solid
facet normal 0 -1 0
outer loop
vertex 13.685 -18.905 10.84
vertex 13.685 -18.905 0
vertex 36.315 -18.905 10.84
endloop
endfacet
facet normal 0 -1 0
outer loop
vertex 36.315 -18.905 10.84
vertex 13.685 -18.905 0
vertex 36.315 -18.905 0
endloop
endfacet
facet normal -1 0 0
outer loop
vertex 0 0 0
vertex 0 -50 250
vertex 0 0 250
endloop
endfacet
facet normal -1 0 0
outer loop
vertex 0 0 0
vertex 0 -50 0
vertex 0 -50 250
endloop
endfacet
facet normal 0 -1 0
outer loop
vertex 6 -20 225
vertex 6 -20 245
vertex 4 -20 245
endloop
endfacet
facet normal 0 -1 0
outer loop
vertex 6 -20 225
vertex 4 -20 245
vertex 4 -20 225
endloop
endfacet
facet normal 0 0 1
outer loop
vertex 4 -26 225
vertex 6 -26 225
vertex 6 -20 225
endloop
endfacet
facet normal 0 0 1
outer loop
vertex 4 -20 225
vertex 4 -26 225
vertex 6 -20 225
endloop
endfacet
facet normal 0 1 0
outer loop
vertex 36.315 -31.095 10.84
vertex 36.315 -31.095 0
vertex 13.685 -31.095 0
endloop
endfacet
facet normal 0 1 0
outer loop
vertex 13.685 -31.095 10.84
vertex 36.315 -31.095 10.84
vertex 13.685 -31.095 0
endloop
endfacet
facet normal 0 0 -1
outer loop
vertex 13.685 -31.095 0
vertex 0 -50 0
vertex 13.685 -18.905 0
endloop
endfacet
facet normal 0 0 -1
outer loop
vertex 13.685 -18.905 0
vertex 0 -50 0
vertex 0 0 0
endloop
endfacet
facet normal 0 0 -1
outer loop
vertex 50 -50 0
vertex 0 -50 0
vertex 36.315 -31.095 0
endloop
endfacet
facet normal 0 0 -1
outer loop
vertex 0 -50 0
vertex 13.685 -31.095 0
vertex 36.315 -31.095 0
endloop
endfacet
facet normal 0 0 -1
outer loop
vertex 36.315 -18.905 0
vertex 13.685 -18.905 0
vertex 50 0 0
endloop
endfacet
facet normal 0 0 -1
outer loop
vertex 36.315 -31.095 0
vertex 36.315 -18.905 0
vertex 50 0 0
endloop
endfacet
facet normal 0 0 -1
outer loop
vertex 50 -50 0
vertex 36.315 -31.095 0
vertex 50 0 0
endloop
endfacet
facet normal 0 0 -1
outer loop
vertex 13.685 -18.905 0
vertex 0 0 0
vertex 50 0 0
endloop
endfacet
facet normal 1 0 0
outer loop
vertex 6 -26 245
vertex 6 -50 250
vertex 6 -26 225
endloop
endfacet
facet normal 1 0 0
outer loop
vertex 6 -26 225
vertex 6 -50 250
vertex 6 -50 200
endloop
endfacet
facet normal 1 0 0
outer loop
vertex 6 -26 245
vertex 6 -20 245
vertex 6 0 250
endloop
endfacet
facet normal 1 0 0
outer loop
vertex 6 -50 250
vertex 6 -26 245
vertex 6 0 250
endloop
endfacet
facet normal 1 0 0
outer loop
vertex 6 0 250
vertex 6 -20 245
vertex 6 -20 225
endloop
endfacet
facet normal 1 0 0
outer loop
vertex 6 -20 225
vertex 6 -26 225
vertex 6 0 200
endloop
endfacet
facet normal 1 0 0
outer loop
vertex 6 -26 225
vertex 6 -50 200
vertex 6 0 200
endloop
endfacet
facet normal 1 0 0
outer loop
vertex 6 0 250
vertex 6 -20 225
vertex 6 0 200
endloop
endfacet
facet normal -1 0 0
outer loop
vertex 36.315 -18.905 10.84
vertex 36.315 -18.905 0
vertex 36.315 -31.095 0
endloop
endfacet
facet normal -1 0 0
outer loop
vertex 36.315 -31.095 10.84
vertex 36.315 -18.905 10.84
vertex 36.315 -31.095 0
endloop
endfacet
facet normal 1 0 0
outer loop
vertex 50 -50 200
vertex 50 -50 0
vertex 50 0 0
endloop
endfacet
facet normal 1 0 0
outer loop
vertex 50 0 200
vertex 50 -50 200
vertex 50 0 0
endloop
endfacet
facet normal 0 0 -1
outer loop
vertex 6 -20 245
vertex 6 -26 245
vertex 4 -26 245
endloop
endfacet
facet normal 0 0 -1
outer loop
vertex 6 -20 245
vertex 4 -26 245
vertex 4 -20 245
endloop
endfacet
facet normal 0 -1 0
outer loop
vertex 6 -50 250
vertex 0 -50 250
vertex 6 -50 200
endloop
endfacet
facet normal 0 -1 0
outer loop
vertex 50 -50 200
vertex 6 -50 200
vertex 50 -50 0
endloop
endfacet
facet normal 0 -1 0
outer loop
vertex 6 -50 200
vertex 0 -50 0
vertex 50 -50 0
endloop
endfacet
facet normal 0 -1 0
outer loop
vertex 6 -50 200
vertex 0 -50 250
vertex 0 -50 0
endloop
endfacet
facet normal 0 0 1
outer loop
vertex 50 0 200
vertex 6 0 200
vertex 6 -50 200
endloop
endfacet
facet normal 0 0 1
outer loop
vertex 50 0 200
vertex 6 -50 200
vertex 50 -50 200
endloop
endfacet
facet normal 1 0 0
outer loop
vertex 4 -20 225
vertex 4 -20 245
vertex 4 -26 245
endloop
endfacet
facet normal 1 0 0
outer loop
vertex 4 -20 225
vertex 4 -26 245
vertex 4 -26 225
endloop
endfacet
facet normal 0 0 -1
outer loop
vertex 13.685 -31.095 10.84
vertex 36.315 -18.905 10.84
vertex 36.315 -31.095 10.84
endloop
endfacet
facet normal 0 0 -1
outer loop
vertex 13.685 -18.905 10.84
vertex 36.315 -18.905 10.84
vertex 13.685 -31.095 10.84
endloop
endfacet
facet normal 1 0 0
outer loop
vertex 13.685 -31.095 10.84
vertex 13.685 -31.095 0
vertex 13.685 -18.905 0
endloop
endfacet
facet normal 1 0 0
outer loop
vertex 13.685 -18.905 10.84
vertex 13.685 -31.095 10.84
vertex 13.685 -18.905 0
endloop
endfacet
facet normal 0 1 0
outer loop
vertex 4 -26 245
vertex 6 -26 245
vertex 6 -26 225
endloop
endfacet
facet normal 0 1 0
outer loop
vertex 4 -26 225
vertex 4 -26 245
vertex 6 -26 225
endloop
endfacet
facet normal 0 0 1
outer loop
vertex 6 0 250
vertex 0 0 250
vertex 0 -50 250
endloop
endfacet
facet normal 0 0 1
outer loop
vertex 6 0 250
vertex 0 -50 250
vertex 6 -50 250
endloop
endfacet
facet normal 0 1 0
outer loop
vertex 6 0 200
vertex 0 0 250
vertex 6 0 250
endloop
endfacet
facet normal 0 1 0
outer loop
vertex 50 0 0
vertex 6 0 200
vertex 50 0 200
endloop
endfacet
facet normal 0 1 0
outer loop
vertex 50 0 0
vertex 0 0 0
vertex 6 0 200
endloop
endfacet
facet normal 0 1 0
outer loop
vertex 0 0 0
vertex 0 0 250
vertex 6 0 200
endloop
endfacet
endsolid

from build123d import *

# Parameters (mm, degrees)
SKETCH1_W           = 50
SKETCH1_H           = 50
BOSS_EXTRUDE1_DEPTH = 200
SKETCH2_W           = 6
SKETCH2_H           = 50
BOSS_EXTRUDE2_DEPTH = 50
SKETCH4_W           = 20
SKETCH4_H           = 6
CUT_EXTRUDE1_DEPTH  = 2
SKETCH5_W           = 11.315
SKETCH5_H           = 6.095
CUT_EXTRUDE2_DEPTH  = 10.84


with BuildPart() as part:
    # Sketch1 → Boss-Extrude1 (new body)
    with BuildSketch(Plane.XY):
        with Locations((25, -25)):
            Rectangle(SKETCH1_W, SKETCH1_H)
    extrude(amount=BOSS_EXTRUDE1_DEPTH)

    # Sketch2 → Boss-Extrude2 (add)
    with BuildSketch(Plane.XY.offset(200)):
        with Locations((3, -25)):
            Rectangle(SKETCH2_W, SKETCH2_H)
    extrude(amount=BOSS_EXTRUDE2_DEPTH)

    # Sketch4 → Cut-Extrude1 (cut)
    with BuildSketch(Plane(origin=(6, 0, 0), x_dir=(0, 0, -1), z_dir=(1, 0, 0))):
        with Locations((-235, -23)):
            Rectangle(SKETCH4_W, SKETCH4_H)
    extrude(amount=-CUT_EXTRUDE1_DEPTH, mode=Mode.SUBTRACT)

    # Sketch5 → Cut-Extrude2 (cut)
    with BuildSketch(Plane(origin=(0, 0, 0), x_dir=(-1, 0, 0), z_dir=(0, 0, -1))):
        Polygon((-36.315, -18.905), (-36.315, -25), (-25, -25), (-13.685, -25), (-13.685, -18.905), align=None)
        with Locations((-30.6575, -28.0475)):
            Rectangle(SKETCH5_W, SKETCH5_H)
        with Locations((-19.3425, -28.0475)):
            Rectangle(SKETCH5_W, SKETCH5_H)
    extrude(amount=-CUT_EXTRUDE2_DEPTH, mode=Mode.SUBTRACT)


solid = part.part
